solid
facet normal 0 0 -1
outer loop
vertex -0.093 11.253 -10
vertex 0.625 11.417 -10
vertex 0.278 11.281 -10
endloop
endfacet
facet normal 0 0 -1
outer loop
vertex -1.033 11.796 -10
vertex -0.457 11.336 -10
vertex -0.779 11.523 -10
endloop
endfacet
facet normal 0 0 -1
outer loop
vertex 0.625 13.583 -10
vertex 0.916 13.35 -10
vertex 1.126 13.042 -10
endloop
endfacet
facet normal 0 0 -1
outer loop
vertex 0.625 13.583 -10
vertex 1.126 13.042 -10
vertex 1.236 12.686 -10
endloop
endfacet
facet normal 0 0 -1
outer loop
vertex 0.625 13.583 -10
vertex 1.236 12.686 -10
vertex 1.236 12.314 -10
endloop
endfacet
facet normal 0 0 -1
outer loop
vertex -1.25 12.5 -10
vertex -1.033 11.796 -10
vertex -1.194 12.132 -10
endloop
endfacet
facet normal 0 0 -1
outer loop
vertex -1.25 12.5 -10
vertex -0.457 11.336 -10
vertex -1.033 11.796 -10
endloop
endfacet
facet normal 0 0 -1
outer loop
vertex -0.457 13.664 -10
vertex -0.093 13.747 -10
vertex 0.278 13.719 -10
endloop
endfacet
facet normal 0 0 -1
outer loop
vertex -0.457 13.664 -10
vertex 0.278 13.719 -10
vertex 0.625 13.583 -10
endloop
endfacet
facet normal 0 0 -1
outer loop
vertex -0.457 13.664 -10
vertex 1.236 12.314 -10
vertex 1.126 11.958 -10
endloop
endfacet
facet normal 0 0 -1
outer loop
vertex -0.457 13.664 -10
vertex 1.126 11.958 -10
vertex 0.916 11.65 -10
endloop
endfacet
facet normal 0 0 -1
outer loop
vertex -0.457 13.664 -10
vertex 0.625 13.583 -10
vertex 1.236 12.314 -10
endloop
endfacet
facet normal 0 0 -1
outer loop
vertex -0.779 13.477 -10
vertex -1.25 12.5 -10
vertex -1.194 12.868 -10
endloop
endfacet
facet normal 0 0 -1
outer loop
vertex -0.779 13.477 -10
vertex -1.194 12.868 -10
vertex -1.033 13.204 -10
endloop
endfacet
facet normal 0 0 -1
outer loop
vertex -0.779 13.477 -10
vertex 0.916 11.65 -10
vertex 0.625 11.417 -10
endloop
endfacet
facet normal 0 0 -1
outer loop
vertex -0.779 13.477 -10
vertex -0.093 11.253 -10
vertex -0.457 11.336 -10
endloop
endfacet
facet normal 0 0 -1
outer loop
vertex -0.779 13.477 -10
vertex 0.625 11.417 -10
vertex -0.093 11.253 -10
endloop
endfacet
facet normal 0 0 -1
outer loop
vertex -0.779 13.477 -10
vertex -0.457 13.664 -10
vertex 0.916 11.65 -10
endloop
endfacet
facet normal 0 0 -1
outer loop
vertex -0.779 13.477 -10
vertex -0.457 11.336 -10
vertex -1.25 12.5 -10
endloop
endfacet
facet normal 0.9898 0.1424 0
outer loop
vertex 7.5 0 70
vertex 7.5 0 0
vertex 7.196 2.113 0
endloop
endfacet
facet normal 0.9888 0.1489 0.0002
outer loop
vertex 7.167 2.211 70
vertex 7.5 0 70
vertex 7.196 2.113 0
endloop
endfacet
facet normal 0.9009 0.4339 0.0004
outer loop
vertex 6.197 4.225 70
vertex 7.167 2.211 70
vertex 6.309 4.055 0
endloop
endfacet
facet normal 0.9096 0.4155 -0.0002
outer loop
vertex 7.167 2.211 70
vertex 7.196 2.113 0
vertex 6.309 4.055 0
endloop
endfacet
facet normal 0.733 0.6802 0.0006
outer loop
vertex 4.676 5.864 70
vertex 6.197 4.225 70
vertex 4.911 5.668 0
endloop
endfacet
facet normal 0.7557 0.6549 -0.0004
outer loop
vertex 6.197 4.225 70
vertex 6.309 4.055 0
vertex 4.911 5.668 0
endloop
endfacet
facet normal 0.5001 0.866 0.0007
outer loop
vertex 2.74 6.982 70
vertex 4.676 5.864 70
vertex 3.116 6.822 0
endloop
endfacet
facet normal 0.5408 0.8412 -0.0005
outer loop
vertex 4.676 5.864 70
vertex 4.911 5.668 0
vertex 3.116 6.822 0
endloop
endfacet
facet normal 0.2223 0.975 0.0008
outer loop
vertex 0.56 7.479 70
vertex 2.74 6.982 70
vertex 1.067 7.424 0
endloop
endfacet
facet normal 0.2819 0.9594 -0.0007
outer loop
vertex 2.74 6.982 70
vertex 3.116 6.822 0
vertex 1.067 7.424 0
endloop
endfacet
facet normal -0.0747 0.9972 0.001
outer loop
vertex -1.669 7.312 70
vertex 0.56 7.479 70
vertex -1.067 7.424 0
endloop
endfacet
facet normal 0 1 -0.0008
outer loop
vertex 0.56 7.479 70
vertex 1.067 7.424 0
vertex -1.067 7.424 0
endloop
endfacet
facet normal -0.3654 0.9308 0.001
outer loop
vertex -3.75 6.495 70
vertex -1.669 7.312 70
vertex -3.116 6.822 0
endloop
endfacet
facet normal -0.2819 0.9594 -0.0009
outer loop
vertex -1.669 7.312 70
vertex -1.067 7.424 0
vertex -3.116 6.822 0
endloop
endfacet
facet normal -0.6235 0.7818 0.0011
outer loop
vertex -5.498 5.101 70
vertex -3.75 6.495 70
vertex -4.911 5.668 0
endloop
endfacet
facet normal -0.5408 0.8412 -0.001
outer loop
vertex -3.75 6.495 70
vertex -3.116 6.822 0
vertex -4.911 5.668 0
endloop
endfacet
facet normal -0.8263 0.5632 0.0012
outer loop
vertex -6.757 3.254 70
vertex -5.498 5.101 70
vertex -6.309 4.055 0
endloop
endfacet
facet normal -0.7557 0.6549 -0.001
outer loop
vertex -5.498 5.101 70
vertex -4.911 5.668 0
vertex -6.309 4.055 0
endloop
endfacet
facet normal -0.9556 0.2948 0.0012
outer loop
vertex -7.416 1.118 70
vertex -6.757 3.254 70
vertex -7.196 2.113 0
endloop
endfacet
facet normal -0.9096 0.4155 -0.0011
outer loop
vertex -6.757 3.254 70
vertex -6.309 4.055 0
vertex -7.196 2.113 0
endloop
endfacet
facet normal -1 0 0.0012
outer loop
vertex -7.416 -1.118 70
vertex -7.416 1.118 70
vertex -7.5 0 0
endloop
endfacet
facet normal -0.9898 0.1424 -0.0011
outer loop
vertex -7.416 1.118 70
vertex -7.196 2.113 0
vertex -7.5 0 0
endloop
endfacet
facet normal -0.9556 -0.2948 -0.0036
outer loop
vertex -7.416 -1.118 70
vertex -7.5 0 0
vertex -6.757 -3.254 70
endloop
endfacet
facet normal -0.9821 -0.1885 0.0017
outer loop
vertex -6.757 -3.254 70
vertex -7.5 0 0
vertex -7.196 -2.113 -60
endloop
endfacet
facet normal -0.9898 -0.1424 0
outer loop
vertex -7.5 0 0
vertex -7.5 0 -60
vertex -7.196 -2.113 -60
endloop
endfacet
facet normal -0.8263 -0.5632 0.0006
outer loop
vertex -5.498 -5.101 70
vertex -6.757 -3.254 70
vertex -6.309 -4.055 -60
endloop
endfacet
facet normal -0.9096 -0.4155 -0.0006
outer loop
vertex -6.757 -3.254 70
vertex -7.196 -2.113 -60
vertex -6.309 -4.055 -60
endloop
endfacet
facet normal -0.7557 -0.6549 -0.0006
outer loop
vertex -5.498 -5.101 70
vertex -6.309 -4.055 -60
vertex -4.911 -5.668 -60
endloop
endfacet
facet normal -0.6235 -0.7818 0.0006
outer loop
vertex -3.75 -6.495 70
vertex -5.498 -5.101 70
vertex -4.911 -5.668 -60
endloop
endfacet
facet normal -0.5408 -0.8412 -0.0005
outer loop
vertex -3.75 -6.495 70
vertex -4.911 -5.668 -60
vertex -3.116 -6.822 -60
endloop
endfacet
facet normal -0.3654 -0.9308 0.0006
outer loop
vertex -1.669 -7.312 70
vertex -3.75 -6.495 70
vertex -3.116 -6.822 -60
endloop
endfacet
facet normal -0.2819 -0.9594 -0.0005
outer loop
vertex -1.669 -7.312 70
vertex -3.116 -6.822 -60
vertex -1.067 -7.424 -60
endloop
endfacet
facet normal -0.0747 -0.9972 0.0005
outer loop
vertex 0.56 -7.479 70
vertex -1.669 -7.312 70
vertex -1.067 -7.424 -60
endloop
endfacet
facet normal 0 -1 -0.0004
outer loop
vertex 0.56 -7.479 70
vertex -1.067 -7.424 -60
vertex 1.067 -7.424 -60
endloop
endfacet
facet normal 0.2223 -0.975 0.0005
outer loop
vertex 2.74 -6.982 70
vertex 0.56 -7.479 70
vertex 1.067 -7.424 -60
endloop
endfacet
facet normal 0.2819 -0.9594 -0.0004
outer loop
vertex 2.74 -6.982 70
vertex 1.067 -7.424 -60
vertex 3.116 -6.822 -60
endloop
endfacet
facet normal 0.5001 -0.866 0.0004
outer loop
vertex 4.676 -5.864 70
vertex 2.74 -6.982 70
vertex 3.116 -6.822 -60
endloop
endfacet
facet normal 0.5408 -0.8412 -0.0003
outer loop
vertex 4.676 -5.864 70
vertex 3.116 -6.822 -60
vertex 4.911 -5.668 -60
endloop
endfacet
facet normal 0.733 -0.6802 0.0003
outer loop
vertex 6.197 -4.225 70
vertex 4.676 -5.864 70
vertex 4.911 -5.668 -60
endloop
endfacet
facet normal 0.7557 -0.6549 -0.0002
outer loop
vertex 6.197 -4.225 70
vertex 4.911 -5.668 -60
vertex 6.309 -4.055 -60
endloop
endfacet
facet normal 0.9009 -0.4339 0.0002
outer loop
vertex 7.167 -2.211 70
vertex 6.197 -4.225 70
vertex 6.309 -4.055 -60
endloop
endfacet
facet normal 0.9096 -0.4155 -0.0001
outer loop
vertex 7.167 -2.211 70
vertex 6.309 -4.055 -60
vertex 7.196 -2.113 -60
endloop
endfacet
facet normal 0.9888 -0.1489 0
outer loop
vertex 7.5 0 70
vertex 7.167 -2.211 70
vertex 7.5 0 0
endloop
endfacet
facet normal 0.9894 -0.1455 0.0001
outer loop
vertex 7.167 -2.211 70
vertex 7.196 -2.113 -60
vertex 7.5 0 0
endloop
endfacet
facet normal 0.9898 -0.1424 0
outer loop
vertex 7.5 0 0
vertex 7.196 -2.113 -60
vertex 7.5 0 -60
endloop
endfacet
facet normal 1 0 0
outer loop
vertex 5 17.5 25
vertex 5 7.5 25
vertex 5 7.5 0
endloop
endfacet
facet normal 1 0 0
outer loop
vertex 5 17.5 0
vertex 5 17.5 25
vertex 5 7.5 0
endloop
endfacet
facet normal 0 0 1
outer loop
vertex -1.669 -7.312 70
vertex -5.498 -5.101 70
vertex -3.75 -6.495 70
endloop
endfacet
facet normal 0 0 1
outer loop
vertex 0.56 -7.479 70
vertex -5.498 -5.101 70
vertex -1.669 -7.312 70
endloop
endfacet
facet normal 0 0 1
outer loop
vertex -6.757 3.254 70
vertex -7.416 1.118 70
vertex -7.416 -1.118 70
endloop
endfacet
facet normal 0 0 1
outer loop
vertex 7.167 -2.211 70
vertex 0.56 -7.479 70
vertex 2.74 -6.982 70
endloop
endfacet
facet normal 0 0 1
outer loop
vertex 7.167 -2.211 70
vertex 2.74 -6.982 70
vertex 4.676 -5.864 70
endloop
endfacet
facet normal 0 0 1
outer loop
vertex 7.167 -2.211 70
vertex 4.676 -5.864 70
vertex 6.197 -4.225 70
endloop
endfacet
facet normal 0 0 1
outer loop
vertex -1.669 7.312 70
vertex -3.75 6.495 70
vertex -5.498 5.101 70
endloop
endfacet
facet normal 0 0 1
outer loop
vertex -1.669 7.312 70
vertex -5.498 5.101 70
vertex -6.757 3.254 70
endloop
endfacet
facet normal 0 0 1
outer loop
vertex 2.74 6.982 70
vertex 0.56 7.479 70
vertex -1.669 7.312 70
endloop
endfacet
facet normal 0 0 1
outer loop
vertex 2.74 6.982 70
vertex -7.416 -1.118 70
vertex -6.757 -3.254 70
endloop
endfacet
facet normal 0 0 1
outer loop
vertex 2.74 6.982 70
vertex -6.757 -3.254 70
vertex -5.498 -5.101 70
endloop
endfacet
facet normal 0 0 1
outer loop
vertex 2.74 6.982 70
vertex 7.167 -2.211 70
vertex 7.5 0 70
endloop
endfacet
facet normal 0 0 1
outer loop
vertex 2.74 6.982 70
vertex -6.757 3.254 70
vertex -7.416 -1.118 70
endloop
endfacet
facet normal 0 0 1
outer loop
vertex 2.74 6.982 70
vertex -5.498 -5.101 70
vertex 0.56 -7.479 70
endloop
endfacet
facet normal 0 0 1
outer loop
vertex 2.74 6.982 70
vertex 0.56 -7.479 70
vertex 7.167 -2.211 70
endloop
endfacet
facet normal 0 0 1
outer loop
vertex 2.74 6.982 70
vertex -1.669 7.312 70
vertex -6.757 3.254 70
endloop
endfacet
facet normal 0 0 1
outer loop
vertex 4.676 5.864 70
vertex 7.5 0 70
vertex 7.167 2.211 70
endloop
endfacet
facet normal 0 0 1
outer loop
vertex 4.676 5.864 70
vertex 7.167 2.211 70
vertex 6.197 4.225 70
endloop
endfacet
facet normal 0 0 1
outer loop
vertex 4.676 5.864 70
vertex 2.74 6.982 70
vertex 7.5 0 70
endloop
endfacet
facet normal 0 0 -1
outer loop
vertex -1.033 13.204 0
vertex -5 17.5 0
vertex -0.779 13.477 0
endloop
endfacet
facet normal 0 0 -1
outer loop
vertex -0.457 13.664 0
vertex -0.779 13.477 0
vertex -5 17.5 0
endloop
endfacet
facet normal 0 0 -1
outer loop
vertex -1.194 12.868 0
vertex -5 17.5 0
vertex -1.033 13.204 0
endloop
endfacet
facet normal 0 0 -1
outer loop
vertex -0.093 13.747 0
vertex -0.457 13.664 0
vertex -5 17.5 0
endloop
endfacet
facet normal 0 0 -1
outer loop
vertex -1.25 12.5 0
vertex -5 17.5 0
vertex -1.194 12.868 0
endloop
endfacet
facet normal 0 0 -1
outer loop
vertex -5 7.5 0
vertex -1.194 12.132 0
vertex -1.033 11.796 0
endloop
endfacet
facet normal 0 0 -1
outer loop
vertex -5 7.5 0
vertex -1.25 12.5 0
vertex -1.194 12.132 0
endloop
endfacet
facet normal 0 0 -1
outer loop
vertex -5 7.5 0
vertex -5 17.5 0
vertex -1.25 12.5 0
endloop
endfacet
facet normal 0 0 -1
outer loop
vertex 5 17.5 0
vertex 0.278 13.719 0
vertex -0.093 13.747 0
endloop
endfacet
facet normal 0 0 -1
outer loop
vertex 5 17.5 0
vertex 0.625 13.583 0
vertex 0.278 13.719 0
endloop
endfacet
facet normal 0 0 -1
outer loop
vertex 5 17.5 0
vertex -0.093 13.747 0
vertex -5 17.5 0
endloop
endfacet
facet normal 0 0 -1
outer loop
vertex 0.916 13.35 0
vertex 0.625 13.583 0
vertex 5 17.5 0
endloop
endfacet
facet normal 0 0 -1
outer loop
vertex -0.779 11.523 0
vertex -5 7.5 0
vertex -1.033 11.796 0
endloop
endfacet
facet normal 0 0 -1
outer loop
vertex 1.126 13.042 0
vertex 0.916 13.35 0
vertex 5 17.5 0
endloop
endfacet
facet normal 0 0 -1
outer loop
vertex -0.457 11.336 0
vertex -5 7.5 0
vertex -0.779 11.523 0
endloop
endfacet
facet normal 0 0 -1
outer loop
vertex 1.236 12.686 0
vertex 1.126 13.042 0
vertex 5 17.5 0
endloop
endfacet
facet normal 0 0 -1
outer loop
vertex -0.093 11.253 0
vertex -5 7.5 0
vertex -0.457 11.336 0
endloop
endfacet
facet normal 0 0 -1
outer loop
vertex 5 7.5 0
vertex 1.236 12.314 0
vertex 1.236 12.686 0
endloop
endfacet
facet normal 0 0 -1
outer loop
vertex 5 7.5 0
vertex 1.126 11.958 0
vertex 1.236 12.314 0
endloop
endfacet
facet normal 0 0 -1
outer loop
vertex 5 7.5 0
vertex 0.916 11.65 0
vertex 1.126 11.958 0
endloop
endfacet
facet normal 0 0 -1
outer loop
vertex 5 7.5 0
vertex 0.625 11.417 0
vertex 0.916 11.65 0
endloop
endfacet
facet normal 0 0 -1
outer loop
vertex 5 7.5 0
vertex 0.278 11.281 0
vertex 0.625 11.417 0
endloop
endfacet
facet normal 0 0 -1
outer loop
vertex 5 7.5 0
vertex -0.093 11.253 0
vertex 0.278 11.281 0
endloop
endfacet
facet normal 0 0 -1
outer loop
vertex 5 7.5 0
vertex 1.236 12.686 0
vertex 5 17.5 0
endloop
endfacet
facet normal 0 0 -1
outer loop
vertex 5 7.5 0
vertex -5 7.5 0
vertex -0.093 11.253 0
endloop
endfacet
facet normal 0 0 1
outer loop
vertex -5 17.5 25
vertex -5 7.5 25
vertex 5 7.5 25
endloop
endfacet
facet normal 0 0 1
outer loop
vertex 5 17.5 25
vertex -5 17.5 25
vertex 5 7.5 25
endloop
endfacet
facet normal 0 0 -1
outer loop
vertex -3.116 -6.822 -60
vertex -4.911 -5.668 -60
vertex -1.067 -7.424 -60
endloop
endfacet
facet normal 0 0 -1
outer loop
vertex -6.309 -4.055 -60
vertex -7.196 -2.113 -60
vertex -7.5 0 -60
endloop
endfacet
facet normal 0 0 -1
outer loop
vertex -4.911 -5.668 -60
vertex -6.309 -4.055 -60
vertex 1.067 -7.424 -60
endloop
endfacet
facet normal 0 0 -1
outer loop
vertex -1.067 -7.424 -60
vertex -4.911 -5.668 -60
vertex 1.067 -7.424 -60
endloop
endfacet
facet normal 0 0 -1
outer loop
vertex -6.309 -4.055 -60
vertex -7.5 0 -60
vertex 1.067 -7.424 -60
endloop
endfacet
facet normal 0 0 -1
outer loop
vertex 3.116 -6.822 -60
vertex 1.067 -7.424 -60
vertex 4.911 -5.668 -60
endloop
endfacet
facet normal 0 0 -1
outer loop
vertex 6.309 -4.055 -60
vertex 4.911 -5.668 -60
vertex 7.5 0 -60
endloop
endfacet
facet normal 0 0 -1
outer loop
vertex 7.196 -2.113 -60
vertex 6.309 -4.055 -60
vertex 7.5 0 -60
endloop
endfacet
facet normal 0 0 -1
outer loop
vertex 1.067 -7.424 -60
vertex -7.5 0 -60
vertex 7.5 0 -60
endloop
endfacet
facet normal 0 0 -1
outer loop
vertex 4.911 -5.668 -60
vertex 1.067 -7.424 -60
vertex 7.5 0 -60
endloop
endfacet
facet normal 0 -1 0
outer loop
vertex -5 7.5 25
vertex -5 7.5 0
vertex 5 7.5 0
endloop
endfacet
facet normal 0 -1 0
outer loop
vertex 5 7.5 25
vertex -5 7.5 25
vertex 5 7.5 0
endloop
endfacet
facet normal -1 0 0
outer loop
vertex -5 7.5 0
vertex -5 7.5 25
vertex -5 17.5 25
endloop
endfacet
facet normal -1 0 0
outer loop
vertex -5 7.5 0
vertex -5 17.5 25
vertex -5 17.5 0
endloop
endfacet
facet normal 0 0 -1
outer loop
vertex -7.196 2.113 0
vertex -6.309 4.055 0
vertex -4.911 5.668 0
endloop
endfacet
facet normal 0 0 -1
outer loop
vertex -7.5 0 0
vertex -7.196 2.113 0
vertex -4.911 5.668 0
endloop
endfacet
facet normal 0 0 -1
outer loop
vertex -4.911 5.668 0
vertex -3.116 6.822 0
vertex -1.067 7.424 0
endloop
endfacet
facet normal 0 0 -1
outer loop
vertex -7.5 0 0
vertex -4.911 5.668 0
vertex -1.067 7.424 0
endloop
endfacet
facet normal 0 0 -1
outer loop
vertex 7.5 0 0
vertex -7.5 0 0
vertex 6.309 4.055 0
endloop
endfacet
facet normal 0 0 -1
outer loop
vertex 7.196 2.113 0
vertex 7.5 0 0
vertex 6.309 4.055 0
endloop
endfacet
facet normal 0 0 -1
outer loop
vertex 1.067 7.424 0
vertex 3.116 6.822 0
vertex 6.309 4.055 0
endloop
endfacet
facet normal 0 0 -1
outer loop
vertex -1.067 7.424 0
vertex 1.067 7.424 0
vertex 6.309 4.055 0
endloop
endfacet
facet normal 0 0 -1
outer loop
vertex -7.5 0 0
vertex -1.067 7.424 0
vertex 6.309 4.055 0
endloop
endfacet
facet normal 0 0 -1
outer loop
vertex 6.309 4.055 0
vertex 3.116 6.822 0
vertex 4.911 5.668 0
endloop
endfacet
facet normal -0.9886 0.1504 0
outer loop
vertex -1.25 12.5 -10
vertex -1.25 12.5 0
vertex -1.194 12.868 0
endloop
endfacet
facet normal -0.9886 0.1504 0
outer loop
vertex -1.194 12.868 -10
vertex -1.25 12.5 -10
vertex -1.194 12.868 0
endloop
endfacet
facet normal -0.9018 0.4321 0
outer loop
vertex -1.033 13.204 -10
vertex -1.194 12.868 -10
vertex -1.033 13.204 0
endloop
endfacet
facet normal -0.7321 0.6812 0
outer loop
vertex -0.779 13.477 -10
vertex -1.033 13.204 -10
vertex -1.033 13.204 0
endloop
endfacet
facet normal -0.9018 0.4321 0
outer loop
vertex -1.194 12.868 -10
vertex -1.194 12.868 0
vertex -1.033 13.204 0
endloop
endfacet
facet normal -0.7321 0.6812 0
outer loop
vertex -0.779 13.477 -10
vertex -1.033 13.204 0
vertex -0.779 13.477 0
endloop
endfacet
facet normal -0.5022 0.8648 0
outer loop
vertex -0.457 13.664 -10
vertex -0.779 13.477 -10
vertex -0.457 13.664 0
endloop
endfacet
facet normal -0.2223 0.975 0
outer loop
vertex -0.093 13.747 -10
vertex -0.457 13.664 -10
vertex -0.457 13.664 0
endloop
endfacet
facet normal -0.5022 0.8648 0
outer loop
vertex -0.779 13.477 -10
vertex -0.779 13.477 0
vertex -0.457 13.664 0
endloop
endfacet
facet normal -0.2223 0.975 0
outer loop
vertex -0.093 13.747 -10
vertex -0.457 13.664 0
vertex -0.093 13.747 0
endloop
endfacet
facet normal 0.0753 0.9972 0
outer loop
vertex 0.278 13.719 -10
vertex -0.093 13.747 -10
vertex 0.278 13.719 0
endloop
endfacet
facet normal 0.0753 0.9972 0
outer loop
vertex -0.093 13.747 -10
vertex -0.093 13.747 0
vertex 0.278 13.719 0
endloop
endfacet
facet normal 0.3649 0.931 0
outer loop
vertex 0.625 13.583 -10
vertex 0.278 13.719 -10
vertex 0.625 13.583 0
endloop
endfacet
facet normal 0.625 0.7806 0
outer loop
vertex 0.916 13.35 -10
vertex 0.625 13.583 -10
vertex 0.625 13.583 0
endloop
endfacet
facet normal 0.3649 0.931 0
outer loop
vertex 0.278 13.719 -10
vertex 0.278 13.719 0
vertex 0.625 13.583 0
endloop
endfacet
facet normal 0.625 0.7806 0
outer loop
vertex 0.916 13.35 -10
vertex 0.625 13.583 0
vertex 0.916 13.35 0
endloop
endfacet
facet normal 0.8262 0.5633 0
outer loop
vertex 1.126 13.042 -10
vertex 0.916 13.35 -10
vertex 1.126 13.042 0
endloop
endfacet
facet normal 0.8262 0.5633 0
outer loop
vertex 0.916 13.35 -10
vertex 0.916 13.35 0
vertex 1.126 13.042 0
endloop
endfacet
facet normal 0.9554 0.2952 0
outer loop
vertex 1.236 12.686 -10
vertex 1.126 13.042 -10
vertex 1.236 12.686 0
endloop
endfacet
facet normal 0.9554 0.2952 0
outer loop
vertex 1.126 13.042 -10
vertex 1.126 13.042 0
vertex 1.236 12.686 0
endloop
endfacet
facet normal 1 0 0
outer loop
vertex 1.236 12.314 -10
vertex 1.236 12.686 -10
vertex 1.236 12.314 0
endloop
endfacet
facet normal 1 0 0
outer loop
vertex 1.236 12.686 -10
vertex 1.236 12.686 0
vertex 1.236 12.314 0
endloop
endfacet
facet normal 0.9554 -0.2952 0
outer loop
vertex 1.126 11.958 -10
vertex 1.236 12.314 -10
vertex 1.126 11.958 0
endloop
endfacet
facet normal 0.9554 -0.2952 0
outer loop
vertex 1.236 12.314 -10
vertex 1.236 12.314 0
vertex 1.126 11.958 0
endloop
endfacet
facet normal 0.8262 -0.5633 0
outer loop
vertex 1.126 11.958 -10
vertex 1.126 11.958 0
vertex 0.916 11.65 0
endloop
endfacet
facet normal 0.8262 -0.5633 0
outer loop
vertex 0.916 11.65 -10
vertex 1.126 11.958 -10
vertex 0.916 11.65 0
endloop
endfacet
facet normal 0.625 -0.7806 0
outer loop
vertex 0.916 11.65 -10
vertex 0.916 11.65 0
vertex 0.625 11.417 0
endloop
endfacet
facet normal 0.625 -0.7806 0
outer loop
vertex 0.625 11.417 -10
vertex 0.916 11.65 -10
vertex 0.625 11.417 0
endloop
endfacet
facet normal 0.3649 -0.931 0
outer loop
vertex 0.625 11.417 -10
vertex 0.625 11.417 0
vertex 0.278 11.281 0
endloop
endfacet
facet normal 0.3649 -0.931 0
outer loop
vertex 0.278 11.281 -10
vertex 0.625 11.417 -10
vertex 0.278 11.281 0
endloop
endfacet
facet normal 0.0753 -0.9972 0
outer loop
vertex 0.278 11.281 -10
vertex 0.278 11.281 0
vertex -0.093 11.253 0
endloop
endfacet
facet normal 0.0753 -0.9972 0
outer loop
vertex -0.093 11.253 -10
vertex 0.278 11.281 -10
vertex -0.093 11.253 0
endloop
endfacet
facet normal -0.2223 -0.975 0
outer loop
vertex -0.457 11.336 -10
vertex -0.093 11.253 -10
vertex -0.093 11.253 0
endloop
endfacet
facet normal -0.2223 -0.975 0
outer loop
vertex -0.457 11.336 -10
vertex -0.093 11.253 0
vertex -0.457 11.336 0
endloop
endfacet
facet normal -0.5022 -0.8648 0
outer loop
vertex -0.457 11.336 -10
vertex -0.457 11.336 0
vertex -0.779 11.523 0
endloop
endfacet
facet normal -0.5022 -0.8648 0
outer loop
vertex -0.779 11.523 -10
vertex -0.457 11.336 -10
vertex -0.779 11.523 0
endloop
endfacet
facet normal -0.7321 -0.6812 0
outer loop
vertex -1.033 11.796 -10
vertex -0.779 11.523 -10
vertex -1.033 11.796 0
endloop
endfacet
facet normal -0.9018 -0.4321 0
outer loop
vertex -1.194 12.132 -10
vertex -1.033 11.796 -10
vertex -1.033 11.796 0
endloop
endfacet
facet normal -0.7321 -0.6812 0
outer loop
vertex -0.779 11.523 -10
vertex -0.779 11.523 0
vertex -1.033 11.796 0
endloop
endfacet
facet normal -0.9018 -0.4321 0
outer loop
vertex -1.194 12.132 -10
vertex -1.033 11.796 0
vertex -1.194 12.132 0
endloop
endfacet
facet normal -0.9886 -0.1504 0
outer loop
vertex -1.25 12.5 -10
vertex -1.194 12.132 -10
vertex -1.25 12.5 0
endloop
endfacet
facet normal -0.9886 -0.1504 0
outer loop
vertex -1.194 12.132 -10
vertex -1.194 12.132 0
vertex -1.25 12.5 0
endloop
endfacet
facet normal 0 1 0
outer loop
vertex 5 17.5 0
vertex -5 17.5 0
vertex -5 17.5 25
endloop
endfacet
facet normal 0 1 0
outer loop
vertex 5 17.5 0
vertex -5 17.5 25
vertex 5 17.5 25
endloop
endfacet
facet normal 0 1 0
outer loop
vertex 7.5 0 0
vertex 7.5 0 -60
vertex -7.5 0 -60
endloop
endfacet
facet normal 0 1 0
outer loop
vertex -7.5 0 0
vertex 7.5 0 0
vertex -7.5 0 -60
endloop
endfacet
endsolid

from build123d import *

# Parameters (mm, degrees)
SKETCH_1_R      = 7.5
EXTRUDE_1_DEPTH = 70
EXTRUDE_START   = 60
EXTRUDE_2_DEPTH = 60
SKETCH_4_W      = 10
SKETCH_4_H      = 25
EXTRUDE_3_DEPTH = 10
SKETCH_5_R      = 1.25
EXTRUDE_4_DEPTH = 10


with BuildPart() as part:
    # 草圖1 → 填料-伸長1 (new body)
    with BuildSketch(Plane.XY):
        Circle(SKETCH_1_R)
    extrude(amount=EXTRUDE_1_DEPTH)

    # 草圖2 → 填料-伸長2 (add)
    with BuildSketch(Plane(origin=(0, 0, 0), x_dir=(-1, 0, 0), z_dir=(0, 0, -1)).offset(EXTRUDE_START)):
        with BuildLine():
            Line((-7.5, 0), (7.5, 0))
            ThreePointArc((7.5, 0), (0, -7.5), (-7.5, 0))
        make_face()
    extrude(amount=-EXTRUDE_2_DEPTH)


with BuildPart() as body_2:
    # 草圖4 → 填料-伸長3 (new body)
    with BuildSketch(Plane(origin=(0, 7.5, 0), x_dir=(1, 0, 0), z_dir=(0, 1, 0))):
        with Locations((0, -12.5)):
            Rectangle(SKETCH_4_W, SKETCH_4_H)
    extrude(amount=EXTRUDE_3_DEPTH)

    # 草圖5 → 填料-伸長4 (add)
    with BuildSketch(Plane(origin=(0, 0, 0), x_dir=(-1, 0, 0), z_dir=(0, 0, -1))):
        with Locations((0, 12.5)):
            Circle(SKETCH_5_R)
    extrude(amount=EXTRUDE_4_DEPTH)


solid = Compound([part.part, body_2.part])
